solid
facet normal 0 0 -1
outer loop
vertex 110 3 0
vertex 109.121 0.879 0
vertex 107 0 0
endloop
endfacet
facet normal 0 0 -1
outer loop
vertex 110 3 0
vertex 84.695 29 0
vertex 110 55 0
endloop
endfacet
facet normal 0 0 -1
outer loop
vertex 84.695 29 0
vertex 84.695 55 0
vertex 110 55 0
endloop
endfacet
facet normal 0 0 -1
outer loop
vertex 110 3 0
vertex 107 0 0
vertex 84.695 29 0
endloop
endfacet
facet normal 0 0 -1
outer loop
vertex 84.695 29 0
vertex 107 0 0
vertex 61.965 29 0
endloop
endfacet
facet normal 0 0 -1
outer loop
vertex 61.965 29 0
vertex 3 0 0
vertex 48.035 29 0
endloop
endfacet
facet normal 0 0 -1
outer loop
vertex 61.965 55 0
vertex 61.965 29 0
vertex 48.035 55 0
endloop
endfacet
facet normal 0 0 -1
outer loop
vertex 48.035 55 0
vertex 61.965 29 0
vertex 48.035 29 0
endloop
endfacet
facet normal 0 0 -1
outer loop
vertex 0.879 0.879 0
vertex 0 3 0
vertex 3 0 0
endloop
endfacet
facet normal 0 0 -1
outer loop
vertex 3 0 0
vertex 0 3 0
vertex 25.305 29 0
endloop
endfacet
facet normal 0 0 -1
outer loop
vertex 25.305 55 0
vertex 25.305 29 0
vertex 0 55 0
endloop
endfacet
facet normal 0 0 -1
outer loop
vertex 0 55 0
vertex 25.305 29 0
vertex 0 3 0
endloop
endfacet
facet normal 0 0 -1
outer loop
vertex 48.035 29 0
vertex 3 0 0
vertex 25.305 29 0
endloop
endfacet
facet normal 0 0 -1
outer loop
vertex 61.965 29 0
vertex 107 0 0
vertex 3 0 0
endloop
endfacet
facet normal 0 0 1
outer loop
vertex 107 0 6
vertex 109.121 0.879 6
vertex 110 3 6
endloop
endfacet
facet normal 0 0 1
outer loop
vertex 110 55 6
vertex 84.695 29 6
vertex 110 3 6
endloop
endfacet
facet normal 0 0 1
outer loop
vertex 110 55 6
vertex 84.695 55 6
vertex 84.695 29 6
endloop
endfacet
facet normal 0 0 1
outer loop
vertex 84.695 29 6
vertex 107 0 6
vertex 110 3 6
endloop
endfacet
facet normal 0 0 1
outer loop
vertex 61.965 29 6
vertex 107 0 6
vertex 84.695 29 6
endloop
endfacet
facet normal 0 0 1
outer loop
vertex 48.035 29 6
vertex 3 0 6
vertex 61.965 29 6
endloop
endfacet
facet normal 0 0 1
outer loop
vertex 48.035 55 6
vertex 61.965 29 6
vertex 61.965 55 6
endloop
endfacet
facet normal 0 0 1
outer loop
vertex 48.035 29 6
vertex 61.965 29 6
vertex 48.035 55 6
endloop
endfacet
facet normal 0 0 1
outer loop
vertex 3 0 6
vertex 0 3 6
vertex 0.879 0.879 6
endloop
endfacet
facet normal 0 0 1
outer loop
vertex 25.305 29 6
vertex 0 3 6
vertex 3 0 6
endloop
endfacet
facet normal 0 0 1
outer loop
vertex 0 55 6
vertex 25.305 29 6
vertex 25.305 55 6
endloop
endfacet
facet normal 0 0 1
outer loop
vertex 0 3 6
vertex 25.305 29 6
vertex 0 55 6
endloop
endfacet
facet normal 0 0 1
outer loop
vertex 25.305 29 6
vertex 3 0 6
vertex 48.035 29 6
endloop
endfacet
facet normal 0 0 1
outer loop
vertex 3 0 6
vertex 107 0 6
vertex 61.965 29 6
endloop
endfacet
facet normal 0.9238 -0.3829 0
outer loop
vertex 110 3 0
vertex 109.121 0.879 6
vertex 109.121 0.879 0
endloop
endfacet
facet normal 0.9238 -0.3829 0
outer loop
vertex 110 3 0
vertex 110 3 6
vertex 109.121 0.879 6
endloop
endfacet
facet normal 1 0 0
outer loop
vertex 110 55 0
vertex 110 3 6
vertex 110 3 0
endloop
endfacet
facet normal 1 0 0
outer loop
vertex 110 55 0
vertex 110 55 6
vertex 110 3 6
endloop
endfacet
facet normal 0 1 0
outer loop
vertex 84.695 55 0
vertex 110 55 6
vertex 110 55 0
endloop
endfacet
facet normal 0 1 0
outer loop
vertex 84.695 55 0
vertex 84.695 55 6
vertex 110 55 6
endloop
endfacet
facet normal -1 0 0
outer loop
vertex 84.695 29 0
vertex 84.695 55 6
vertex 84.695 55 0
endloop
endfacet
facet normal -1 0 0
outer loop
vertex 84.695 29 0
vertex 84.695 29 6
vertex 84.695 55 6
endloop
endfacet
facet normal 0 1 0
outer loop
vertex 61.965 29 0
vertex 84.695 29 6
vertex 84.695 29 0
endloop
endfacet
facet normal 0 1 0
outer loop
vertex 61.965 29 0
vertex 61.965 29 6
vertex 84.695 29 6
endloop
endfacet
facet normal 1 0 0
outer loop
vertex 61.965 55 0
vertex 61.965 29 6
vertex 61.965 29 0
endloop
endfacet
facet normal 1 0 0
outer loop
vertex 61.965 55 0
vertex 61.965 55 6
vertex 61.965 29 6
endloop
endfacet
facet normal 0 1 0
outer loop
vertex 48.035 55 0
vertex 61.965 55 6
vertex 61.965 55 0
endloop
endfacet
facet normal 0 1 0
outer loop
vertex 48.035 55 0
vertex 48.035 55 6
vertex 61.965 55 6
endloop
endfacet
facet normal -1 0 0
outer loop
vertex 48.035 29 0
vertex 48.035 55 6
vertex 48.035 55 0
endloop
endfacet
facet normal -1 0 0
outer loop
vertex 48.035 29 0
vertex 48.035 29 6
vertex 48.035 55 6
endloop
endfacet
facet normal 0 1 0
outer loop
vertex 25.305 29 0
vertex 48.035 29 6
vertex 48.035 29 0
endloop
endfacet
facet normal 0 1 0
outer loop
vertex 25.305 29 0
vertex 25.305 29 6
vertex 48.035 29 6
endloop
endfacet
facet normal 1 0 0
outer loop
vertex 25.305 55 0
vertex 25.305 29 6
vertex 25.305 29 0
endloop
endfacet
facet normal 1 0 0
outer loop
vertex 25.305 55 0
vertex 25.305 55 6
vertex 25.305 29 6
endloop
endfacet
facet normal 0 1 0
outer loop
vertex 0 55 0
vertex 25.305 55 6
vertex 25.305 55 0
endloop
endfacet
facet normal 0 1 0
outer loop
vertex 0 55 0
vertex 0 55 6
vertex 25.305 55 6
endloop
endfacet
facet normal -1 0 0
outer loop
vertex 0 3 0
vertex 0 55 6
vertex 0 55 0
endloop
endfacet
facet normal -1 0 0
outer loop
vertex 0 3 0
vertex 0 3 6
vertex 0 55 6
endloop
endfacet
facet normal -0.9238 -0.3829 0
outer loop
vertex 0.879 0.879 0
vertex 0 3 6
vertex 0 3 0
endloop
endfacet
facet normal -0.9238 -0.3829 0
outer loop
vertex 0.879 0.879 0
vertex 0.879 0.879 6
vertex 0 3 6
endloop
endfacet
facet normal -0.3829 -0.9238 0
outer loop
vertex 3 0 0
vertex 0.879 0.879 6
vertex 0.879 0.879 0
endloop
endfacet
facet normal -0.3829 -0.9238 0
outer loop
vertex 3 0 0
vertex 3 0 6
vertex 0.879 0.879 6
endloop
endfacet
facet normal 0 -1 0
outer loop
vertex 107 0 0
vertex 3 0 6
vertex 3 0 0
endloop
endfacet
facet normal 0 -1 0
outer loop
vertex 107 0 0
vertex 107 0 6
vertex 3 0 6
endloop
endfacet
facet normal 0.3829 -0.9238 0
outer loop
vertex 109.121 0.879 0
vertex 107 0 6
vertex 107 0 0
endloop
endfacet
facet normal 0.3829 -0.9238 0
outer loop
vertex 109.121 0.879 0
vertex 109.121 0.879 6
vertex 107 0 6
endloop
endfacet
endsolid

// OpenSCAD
$fn = 32;

// ----------------------------------------------------------------------
// Window plate: 110 x 55 mm, 2 open windows
// ----------------------------------------------------------------------

// --- parameters (mm) ---
profile_height = 6;       // extrusion height
profile_points = 16;      // points of the closed outline

profile = [[0, 3], [0.879, 0.879], [3, 0], [107, 0], [109.121, 0.879], [110, 3], [110, 55], [84.695, 55], [84.695, 29], [61.965, 29], [61.965, 55], [48.035, 55], [48.035, 29], [25.305, 29], [25.305, 55], [0, 55]];  // single closed polygon, 16 points, counter clockwise

// --- the one profile operation ---
linear_extrude(height = profile_height) polygon(points = profile);
